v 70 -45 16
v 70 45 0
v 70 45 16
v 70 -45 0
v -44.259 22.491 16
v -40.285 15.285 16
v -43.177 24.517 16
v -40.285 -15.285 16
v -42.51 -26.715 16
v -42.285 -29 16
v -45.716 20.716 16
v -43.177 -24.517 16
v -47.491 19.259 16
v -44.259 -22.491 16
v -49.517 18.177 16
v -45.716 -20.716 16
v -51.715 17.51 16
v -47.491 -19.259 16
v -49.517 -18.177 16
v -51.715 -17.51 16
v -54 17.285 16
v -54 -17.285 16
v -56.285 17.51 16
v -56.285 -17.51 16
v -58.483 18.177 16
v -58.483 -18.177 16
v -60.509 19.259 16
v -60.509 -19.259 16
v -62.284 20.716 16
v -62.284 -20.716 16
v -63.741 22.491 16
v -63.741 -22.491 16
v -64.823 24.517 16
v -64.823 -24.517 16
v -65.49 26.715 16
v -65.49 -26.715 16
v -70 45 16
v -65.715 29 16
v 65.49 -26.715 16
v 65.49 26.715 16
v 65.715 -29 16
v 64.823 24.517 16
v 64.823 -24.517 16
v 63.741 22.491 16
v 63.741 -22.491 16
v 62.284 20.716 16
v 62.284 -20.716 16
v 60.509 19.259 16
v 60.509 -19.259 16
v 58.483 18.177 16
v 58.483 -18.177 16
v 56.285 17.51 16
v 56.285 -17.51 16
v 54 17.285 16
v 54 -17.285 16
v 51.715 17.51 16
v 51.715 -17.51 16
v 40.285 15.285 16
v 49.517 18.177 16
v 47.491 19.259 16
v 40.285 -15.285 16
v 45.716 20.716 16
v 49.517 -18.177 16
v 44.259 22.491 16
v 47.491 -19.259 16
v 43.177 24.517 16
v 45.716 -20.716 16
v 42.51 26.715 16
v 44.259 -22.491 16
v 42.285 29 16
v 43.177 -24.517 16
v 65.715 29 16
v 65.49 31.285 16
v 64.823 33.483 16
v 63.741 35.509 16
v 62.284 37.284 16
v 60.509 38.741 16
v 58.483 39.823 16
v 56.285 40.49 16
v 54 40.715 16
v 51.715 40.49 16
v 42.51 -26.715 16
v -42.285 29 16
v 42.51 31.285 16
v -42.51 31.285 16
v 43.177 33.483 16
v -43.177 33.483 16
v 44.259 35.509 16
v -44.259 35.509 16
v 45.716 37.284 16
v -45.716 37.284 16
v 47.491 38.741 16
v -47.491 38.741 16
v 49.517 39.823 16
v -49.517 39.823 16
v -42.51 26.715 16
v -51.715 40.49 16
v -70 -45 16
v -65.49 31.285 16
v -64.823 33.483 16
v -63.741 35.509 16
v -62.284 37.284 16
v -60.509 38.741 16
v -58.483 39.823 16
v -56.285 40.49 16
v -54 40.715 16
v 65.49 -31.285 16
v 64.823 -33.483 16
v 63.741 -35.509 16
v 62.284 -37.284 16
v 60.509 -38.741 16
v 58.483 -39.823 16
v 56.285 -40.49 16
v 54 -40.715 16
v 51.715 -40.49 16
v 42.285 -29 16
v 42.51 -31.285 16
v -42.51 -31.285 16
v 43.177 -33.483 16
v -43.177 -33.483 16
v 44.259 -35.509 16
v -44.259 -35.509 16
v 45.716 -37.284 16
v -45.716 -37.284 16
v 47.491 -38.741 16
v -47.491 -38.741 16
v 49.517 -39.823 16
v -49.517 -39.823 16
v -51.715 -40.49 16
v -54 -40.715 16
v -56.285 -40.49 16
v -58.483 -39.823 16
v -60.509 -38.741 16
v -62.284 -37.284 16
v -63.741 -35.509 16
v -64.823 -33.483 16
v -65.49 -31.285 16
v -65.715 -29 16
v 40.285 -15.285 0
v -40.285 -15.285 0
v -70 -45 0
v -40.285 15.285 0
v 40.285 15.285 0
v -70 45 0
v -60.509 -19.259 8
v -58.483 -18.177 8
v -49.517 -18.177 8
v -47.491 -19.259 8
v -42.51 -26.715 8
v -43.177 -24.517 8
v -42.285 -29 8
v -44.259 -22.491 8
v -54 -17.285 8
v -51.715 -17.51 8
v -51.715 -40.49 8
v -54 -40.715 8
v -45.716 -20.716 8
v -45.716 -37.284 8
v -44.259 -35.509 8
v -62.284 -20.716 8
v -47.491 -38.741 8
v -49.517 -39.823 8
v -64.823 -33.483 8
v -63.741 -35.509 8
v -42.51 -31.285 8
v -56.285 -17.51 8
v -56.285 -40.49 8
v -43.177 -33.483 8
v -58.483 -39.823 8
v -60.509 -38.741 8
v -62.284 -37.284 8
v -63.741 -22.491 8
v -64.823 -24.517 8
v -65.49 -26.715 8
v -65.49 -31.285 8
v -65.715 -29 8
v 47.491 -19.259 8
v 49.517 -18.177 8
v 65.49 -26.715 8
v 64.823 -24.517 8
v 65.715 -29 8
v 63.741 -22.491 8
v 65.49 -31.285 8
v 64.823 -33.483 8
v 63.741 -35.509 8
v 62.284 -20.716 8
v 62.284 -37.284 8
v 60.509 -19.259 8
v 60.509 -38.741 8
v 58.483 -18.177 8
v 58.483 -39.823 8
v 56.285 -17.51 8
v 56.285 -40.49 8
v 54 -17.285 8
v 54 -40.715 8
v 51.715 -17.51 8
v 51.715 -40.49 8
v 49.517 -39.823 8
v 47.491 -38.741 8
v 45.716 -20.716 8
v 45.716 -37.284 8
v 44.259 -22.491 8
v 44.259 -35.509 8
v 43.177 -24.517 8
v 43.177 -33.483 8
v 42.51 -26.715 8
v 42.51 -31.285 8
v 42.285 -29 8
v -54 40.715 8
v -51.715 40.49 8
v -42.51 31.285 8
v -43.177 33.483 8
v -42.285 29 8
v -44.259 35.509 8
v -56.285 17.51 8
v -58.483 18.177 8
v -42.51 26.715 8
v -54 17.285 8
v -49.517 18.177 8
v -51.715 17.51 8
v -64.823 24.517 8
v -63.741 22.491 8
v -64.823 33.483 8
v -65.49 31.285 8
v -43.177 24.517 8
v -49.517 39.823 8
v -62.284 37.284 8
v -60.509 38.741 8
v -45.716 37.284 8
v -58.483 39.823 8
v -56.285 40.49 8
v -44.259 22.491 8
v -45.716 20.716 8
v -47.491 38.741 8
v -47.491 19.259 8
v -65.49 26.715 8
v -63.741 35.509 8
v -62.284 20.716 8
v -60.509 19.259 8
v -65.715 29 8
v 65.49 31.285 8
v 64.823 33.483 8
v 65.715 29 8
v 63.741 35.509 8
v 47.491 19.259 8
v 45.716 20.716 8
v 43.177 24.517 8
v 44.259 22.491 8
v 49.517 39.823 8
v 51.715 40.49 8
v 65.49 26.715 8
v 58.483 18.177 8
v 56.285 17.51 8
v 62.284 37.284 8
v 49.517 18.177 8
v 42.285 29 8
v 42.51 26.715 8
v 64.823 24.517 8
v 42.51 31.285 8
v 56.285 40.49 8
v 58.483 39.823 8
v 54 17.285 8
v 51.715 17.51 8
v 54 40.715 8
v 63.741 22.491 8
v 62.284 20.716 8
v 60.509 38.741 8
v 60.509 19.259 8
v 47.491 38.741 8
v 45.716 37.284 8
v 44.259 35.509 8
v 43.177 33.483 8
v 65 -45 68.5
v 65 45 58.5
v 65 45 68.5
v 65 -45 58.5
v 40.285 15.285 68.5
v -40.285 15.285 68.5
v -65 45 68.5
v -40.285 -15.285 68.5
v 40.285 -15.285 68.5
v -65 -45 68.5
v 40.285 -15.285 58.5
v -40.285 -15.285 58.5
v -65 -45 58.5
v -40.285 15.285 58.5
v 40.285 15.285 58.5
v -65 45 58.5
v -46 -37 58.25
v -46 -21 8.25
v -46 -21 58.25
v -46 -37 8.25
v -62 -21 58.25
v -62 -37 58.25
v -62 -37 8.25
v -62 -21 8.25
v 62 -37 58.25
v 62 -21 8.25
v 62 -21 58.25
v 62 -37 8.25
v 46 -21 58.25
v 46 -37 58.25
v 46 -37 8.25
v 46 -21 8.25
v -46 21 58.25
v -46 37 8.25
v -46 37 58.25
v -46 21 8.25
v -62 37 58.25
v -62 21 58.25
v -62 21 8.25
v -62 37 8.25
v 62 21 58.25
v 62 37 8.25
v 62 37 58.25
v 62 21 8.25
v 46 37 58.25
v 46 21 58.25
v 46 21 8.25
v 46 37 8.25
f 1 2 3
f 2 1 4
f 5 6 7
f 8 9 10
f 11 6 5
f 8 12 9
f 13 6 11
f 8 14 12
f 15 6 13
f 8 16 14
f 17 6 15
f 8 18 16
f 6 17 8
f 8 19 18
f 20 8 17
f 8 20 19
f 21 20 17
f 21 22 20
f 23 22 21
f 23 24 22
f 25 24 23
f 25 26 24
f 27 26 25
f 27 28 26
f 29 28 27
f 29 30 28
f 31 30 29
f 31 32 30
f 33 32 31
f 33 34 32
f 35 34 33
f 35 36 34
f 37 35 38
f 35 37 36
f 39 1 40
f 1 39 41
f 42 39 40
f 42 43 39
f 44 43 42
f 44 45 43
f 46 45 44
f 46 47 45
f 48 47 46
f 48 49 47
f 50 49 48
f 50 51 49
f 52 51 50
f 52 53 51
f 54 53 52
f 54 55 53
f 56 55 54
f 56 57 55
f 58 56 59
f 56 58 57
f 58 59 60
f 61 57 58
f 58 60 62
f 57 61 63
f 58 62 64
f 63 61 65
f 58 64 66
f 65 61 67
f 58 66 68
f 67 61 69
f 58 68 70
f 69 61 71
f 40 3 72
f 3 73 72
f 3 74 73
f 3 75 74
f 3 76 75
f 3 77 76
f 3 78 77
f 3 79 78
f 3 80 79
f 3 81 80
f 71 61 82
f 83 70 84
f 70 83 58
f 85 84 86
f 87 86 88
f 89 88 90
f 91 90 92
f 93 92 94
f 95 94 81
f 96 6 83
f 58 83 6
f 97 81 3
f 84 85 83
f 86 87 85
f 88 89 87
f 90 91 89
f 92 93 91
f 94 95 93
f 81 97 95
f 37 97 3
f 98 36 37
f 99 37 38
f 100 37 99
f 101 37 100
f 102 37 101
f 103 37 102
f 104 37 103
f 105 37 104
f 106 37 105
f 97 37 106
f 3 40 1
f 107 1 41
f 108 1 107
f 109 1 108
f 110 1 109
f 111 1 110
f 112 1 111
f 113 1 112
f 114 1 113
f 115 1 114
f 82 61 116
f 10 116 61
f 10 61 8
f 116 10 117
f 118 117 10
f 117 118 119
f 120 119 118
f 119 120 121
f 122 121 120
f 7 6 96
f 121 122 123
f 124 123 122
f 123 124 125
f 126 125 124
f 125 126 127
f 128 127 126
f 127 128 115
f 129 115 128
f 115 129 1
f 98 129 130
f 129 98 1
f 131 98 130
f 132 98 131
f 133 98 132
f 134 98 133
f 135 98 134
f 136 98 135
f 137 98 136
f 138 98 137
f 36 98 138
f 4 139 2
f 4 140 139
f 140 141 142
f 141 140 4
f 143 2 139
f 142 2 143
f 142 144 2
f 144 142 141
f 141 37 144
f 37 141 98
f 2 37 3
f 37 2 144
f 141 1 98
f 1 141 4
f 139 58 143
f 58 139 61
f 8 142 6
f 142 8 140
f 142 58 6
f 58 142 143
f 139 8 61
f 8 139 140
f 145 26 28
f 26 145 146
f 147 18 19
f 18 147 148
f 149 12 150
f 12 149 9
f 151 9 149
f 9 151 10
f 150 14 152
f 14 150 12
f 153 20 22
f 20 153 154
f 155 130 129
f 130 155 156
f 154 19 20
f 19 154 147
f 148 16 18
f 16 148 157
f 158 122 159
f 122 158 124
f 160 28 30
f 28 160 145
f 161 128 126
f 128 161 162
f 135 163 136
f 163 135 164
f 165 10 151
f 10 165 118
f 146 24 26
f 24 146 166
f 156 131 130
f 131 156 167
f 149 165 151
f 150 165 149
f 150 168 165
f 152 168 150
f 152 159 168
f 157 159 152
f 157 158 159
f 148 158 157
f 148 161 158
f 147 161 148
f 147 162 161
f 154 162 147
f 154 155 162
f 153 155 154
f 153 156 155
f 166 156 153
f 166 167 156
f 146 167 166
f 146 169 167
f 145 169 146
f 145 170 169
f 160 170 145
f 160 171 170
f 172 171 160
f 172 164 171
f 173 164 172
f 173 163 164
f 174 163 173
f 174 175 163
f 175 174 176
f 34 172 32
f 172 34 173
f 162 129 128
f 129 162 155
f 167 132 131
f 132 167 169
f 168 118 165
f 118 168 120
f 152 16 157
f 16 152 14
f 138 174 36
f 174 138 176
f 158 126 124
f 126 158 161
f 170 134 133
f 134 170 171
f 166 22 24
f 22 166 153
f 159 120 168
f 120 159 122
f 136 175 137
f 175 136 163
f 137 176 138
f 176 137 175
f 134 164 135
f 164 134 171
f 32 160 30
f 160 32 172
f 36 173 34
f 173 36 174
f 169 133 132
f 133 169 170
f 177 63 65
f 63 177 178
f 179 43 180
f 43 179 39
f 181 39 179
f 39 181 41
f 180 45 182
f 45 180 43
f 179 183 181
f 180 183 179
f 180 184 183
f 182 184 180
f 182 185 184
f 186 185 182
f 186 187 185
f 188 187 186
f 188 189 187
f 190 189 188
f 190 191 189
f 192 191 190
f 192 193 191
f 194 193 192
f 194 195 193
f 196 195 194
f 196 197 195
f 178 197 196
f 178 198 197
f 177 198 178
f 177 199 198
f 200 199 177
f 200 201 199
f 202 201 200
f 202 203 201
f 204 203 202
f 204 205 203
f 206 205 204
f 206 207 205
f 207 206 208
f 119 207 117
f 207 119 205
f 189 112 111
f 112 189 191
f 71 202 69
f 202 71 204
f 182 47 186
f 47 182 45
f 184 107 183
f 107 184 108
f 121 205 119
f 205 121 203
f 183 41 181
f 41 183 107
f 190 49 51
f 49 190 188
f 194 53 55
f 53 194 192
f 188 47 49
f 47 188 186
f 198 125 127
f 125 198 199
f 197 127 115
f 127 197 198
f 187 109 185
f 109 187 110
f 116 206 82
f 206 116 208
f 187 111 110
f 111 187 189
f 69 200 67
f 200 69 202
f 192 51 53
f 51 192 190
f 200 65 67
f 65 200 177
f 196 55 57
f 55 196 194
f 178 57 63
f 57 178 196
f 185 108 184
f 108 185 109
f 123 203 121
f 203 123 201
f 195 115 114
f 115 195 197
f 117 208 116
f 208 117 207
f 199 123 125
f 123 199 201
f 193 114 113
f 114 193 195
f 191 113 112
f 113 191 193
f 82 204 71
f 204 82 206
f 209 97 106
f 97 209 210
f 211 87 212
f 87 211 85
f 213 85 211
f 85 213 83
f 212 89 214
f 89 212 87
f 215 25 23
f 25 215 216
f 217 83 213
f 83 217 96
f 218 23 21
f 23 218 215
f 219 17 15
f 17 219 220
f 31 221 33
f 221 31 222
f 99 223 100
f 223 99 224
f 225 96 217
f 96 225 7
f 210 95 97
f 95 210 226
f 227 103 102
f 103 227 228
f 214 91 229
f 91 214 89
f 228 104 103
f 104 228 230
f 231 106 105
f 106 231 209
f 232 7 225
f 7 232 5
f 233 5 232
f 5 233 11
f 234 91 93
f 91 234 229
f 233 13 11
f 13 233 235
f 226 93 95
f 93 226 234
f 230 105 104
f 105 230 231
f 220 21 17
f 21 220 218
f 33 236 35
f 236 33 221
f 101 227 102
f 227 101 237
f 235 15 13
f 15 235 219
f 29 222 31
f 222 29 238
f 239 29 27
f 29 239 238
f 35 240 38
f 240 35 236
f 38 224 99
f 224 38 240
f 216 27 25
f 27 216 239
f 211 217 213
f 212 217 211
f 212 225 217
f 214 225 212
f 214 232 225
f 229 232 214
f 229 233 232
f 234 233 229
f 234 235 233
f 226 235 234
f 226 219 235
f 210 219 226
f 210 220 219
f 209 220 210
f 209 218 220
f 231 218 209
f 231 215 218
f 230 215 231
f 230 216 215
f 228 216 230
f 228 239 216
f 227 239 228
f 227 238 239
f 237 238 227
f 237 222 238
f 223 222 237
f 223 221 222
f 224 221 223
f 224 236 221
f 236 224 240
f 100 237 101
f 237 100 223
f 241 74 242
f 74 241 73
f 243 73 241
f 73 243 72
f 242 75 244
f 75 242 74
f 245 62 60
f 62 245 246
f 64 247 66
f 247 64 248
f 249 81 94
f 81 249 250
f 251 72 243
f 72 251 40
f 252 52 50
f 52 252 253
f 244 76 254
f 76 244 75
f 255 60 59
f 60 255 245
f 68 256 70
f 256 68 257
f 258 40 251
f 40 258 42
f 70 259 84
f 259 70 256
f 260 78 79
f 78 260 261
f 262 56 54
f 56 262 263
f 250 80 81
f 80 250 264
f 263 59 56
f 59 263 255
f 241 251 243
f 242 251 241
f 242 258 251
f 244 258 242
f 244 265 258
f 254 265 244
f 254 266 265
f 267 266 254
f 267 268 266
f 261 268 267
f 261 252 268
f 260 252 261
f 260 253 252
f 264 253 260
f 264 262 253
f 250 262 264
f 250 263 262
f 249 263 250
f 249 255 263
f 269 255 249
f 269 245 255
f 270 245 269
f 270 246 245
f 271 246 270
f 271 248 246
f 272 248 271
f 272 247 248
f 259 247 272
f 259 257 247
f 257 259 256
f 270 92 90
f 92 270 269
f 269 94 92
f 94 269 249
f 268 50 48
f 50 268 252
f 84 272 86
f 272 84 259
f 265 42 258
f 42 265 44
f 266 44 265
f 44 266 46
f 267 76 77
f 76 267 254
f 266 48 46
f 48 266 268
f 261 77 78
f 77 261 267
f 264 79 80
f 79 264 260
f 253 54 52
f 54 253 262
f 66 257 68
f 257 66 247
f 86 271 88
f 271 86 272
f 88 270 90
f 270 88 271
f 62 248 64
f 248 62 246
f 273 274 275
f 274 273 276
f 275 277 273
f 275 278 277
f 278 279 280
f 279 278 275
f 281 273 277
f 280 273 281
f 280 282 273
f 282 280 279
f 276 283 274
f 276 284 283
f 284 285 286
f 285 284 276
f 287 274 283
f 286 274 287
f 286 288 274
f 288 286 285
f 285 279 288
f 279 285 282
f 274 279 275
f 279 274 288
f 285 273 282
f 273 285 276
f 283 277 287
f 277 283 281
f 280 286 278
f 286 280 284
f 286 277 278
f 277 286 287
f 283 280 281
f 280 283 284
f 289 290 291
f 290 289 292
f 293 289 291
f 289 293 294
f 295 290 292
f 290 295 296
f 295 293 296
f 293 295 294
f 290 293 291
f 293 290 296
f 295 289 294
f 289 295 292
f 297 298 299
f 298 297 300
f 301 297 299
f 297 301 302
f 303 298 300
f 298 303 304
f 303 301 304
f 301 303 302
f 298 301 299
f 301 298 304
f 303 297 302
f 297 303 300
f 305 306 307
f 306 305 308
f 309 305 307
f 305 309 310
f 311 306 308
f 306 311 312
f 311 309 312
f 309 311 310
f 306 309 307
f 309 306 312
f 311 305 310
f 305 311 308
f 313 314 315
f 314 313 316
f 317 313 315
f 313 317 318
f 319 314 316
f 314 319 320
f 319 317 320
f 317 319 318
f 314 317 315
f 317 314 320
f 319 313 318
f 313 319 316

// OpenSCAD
$fn = 32;

// ------------------------------------------------------------------------
// Frame cube: base 140 x 90 mm, posts 50 mm tall
// Every part is its own module, assembly() places every instance.
// ------------------------------------------------------------------------

// --- part 1 ---
module base_frame() {
  difference() {
    translate([-70, -45, 0]) cube([140, 90, 16]);
    translate([-40.285, -15.285, -1]) cube([80.57, 30.57, 18]);
    translate([-54, -29, 8]) cylinder(h = 9, d = 23.43);
    translate([54, -29, 8]) cylinder(h = 9, d = 23.43);
    translate([-54, 29, 8]) cylinder(h = 9, d = 23.43);
    translate([54, 29, 8]) cylinder(h = 9, d = 23.43);
  }
}

// --- part 2 ---
module corner_post() {
  translate([-8, -8, 0]) cube([16, 16, 50]);
}

// --- part 3 ---
module top_frame() {
  difference() {
    translate([-65, -45, 0]) cube([130, 90, 10]);
    translate([-40.285, -15.285, -1]) cube([80.57, 30.57, 12]);
  }
}

// --- assembly ---
module assembly() {
  color([0.80, 0.24, 0.20]) translate([0, 0, 0]) rotate([0, 0, 0]) base_frame();
  color([0.20, 0.45, 0.75]) translate([-54, -29, 8.25]) rotate([0, 0, 0]) corner_post();
  color([0.25, 0.62, 0.32]) translate([54, -29, 8.25]) rotate([0, 0, 0]) corner_post();
  color([0.92, 0.70, 0.18]) translate([-54, 29, 8.25]) rotate([0, 0, 0]) corner_post();
  color([0.58, 0.35, 0.70]) translate([54, 29, 8.25]) rotate([0, 0, 0]) corner_post();
  color([0.16, 0.66, 0.66]) translate([0, 0, 58.5]) rotate([0, 0, 0]) top_frame();
}

assembly();
